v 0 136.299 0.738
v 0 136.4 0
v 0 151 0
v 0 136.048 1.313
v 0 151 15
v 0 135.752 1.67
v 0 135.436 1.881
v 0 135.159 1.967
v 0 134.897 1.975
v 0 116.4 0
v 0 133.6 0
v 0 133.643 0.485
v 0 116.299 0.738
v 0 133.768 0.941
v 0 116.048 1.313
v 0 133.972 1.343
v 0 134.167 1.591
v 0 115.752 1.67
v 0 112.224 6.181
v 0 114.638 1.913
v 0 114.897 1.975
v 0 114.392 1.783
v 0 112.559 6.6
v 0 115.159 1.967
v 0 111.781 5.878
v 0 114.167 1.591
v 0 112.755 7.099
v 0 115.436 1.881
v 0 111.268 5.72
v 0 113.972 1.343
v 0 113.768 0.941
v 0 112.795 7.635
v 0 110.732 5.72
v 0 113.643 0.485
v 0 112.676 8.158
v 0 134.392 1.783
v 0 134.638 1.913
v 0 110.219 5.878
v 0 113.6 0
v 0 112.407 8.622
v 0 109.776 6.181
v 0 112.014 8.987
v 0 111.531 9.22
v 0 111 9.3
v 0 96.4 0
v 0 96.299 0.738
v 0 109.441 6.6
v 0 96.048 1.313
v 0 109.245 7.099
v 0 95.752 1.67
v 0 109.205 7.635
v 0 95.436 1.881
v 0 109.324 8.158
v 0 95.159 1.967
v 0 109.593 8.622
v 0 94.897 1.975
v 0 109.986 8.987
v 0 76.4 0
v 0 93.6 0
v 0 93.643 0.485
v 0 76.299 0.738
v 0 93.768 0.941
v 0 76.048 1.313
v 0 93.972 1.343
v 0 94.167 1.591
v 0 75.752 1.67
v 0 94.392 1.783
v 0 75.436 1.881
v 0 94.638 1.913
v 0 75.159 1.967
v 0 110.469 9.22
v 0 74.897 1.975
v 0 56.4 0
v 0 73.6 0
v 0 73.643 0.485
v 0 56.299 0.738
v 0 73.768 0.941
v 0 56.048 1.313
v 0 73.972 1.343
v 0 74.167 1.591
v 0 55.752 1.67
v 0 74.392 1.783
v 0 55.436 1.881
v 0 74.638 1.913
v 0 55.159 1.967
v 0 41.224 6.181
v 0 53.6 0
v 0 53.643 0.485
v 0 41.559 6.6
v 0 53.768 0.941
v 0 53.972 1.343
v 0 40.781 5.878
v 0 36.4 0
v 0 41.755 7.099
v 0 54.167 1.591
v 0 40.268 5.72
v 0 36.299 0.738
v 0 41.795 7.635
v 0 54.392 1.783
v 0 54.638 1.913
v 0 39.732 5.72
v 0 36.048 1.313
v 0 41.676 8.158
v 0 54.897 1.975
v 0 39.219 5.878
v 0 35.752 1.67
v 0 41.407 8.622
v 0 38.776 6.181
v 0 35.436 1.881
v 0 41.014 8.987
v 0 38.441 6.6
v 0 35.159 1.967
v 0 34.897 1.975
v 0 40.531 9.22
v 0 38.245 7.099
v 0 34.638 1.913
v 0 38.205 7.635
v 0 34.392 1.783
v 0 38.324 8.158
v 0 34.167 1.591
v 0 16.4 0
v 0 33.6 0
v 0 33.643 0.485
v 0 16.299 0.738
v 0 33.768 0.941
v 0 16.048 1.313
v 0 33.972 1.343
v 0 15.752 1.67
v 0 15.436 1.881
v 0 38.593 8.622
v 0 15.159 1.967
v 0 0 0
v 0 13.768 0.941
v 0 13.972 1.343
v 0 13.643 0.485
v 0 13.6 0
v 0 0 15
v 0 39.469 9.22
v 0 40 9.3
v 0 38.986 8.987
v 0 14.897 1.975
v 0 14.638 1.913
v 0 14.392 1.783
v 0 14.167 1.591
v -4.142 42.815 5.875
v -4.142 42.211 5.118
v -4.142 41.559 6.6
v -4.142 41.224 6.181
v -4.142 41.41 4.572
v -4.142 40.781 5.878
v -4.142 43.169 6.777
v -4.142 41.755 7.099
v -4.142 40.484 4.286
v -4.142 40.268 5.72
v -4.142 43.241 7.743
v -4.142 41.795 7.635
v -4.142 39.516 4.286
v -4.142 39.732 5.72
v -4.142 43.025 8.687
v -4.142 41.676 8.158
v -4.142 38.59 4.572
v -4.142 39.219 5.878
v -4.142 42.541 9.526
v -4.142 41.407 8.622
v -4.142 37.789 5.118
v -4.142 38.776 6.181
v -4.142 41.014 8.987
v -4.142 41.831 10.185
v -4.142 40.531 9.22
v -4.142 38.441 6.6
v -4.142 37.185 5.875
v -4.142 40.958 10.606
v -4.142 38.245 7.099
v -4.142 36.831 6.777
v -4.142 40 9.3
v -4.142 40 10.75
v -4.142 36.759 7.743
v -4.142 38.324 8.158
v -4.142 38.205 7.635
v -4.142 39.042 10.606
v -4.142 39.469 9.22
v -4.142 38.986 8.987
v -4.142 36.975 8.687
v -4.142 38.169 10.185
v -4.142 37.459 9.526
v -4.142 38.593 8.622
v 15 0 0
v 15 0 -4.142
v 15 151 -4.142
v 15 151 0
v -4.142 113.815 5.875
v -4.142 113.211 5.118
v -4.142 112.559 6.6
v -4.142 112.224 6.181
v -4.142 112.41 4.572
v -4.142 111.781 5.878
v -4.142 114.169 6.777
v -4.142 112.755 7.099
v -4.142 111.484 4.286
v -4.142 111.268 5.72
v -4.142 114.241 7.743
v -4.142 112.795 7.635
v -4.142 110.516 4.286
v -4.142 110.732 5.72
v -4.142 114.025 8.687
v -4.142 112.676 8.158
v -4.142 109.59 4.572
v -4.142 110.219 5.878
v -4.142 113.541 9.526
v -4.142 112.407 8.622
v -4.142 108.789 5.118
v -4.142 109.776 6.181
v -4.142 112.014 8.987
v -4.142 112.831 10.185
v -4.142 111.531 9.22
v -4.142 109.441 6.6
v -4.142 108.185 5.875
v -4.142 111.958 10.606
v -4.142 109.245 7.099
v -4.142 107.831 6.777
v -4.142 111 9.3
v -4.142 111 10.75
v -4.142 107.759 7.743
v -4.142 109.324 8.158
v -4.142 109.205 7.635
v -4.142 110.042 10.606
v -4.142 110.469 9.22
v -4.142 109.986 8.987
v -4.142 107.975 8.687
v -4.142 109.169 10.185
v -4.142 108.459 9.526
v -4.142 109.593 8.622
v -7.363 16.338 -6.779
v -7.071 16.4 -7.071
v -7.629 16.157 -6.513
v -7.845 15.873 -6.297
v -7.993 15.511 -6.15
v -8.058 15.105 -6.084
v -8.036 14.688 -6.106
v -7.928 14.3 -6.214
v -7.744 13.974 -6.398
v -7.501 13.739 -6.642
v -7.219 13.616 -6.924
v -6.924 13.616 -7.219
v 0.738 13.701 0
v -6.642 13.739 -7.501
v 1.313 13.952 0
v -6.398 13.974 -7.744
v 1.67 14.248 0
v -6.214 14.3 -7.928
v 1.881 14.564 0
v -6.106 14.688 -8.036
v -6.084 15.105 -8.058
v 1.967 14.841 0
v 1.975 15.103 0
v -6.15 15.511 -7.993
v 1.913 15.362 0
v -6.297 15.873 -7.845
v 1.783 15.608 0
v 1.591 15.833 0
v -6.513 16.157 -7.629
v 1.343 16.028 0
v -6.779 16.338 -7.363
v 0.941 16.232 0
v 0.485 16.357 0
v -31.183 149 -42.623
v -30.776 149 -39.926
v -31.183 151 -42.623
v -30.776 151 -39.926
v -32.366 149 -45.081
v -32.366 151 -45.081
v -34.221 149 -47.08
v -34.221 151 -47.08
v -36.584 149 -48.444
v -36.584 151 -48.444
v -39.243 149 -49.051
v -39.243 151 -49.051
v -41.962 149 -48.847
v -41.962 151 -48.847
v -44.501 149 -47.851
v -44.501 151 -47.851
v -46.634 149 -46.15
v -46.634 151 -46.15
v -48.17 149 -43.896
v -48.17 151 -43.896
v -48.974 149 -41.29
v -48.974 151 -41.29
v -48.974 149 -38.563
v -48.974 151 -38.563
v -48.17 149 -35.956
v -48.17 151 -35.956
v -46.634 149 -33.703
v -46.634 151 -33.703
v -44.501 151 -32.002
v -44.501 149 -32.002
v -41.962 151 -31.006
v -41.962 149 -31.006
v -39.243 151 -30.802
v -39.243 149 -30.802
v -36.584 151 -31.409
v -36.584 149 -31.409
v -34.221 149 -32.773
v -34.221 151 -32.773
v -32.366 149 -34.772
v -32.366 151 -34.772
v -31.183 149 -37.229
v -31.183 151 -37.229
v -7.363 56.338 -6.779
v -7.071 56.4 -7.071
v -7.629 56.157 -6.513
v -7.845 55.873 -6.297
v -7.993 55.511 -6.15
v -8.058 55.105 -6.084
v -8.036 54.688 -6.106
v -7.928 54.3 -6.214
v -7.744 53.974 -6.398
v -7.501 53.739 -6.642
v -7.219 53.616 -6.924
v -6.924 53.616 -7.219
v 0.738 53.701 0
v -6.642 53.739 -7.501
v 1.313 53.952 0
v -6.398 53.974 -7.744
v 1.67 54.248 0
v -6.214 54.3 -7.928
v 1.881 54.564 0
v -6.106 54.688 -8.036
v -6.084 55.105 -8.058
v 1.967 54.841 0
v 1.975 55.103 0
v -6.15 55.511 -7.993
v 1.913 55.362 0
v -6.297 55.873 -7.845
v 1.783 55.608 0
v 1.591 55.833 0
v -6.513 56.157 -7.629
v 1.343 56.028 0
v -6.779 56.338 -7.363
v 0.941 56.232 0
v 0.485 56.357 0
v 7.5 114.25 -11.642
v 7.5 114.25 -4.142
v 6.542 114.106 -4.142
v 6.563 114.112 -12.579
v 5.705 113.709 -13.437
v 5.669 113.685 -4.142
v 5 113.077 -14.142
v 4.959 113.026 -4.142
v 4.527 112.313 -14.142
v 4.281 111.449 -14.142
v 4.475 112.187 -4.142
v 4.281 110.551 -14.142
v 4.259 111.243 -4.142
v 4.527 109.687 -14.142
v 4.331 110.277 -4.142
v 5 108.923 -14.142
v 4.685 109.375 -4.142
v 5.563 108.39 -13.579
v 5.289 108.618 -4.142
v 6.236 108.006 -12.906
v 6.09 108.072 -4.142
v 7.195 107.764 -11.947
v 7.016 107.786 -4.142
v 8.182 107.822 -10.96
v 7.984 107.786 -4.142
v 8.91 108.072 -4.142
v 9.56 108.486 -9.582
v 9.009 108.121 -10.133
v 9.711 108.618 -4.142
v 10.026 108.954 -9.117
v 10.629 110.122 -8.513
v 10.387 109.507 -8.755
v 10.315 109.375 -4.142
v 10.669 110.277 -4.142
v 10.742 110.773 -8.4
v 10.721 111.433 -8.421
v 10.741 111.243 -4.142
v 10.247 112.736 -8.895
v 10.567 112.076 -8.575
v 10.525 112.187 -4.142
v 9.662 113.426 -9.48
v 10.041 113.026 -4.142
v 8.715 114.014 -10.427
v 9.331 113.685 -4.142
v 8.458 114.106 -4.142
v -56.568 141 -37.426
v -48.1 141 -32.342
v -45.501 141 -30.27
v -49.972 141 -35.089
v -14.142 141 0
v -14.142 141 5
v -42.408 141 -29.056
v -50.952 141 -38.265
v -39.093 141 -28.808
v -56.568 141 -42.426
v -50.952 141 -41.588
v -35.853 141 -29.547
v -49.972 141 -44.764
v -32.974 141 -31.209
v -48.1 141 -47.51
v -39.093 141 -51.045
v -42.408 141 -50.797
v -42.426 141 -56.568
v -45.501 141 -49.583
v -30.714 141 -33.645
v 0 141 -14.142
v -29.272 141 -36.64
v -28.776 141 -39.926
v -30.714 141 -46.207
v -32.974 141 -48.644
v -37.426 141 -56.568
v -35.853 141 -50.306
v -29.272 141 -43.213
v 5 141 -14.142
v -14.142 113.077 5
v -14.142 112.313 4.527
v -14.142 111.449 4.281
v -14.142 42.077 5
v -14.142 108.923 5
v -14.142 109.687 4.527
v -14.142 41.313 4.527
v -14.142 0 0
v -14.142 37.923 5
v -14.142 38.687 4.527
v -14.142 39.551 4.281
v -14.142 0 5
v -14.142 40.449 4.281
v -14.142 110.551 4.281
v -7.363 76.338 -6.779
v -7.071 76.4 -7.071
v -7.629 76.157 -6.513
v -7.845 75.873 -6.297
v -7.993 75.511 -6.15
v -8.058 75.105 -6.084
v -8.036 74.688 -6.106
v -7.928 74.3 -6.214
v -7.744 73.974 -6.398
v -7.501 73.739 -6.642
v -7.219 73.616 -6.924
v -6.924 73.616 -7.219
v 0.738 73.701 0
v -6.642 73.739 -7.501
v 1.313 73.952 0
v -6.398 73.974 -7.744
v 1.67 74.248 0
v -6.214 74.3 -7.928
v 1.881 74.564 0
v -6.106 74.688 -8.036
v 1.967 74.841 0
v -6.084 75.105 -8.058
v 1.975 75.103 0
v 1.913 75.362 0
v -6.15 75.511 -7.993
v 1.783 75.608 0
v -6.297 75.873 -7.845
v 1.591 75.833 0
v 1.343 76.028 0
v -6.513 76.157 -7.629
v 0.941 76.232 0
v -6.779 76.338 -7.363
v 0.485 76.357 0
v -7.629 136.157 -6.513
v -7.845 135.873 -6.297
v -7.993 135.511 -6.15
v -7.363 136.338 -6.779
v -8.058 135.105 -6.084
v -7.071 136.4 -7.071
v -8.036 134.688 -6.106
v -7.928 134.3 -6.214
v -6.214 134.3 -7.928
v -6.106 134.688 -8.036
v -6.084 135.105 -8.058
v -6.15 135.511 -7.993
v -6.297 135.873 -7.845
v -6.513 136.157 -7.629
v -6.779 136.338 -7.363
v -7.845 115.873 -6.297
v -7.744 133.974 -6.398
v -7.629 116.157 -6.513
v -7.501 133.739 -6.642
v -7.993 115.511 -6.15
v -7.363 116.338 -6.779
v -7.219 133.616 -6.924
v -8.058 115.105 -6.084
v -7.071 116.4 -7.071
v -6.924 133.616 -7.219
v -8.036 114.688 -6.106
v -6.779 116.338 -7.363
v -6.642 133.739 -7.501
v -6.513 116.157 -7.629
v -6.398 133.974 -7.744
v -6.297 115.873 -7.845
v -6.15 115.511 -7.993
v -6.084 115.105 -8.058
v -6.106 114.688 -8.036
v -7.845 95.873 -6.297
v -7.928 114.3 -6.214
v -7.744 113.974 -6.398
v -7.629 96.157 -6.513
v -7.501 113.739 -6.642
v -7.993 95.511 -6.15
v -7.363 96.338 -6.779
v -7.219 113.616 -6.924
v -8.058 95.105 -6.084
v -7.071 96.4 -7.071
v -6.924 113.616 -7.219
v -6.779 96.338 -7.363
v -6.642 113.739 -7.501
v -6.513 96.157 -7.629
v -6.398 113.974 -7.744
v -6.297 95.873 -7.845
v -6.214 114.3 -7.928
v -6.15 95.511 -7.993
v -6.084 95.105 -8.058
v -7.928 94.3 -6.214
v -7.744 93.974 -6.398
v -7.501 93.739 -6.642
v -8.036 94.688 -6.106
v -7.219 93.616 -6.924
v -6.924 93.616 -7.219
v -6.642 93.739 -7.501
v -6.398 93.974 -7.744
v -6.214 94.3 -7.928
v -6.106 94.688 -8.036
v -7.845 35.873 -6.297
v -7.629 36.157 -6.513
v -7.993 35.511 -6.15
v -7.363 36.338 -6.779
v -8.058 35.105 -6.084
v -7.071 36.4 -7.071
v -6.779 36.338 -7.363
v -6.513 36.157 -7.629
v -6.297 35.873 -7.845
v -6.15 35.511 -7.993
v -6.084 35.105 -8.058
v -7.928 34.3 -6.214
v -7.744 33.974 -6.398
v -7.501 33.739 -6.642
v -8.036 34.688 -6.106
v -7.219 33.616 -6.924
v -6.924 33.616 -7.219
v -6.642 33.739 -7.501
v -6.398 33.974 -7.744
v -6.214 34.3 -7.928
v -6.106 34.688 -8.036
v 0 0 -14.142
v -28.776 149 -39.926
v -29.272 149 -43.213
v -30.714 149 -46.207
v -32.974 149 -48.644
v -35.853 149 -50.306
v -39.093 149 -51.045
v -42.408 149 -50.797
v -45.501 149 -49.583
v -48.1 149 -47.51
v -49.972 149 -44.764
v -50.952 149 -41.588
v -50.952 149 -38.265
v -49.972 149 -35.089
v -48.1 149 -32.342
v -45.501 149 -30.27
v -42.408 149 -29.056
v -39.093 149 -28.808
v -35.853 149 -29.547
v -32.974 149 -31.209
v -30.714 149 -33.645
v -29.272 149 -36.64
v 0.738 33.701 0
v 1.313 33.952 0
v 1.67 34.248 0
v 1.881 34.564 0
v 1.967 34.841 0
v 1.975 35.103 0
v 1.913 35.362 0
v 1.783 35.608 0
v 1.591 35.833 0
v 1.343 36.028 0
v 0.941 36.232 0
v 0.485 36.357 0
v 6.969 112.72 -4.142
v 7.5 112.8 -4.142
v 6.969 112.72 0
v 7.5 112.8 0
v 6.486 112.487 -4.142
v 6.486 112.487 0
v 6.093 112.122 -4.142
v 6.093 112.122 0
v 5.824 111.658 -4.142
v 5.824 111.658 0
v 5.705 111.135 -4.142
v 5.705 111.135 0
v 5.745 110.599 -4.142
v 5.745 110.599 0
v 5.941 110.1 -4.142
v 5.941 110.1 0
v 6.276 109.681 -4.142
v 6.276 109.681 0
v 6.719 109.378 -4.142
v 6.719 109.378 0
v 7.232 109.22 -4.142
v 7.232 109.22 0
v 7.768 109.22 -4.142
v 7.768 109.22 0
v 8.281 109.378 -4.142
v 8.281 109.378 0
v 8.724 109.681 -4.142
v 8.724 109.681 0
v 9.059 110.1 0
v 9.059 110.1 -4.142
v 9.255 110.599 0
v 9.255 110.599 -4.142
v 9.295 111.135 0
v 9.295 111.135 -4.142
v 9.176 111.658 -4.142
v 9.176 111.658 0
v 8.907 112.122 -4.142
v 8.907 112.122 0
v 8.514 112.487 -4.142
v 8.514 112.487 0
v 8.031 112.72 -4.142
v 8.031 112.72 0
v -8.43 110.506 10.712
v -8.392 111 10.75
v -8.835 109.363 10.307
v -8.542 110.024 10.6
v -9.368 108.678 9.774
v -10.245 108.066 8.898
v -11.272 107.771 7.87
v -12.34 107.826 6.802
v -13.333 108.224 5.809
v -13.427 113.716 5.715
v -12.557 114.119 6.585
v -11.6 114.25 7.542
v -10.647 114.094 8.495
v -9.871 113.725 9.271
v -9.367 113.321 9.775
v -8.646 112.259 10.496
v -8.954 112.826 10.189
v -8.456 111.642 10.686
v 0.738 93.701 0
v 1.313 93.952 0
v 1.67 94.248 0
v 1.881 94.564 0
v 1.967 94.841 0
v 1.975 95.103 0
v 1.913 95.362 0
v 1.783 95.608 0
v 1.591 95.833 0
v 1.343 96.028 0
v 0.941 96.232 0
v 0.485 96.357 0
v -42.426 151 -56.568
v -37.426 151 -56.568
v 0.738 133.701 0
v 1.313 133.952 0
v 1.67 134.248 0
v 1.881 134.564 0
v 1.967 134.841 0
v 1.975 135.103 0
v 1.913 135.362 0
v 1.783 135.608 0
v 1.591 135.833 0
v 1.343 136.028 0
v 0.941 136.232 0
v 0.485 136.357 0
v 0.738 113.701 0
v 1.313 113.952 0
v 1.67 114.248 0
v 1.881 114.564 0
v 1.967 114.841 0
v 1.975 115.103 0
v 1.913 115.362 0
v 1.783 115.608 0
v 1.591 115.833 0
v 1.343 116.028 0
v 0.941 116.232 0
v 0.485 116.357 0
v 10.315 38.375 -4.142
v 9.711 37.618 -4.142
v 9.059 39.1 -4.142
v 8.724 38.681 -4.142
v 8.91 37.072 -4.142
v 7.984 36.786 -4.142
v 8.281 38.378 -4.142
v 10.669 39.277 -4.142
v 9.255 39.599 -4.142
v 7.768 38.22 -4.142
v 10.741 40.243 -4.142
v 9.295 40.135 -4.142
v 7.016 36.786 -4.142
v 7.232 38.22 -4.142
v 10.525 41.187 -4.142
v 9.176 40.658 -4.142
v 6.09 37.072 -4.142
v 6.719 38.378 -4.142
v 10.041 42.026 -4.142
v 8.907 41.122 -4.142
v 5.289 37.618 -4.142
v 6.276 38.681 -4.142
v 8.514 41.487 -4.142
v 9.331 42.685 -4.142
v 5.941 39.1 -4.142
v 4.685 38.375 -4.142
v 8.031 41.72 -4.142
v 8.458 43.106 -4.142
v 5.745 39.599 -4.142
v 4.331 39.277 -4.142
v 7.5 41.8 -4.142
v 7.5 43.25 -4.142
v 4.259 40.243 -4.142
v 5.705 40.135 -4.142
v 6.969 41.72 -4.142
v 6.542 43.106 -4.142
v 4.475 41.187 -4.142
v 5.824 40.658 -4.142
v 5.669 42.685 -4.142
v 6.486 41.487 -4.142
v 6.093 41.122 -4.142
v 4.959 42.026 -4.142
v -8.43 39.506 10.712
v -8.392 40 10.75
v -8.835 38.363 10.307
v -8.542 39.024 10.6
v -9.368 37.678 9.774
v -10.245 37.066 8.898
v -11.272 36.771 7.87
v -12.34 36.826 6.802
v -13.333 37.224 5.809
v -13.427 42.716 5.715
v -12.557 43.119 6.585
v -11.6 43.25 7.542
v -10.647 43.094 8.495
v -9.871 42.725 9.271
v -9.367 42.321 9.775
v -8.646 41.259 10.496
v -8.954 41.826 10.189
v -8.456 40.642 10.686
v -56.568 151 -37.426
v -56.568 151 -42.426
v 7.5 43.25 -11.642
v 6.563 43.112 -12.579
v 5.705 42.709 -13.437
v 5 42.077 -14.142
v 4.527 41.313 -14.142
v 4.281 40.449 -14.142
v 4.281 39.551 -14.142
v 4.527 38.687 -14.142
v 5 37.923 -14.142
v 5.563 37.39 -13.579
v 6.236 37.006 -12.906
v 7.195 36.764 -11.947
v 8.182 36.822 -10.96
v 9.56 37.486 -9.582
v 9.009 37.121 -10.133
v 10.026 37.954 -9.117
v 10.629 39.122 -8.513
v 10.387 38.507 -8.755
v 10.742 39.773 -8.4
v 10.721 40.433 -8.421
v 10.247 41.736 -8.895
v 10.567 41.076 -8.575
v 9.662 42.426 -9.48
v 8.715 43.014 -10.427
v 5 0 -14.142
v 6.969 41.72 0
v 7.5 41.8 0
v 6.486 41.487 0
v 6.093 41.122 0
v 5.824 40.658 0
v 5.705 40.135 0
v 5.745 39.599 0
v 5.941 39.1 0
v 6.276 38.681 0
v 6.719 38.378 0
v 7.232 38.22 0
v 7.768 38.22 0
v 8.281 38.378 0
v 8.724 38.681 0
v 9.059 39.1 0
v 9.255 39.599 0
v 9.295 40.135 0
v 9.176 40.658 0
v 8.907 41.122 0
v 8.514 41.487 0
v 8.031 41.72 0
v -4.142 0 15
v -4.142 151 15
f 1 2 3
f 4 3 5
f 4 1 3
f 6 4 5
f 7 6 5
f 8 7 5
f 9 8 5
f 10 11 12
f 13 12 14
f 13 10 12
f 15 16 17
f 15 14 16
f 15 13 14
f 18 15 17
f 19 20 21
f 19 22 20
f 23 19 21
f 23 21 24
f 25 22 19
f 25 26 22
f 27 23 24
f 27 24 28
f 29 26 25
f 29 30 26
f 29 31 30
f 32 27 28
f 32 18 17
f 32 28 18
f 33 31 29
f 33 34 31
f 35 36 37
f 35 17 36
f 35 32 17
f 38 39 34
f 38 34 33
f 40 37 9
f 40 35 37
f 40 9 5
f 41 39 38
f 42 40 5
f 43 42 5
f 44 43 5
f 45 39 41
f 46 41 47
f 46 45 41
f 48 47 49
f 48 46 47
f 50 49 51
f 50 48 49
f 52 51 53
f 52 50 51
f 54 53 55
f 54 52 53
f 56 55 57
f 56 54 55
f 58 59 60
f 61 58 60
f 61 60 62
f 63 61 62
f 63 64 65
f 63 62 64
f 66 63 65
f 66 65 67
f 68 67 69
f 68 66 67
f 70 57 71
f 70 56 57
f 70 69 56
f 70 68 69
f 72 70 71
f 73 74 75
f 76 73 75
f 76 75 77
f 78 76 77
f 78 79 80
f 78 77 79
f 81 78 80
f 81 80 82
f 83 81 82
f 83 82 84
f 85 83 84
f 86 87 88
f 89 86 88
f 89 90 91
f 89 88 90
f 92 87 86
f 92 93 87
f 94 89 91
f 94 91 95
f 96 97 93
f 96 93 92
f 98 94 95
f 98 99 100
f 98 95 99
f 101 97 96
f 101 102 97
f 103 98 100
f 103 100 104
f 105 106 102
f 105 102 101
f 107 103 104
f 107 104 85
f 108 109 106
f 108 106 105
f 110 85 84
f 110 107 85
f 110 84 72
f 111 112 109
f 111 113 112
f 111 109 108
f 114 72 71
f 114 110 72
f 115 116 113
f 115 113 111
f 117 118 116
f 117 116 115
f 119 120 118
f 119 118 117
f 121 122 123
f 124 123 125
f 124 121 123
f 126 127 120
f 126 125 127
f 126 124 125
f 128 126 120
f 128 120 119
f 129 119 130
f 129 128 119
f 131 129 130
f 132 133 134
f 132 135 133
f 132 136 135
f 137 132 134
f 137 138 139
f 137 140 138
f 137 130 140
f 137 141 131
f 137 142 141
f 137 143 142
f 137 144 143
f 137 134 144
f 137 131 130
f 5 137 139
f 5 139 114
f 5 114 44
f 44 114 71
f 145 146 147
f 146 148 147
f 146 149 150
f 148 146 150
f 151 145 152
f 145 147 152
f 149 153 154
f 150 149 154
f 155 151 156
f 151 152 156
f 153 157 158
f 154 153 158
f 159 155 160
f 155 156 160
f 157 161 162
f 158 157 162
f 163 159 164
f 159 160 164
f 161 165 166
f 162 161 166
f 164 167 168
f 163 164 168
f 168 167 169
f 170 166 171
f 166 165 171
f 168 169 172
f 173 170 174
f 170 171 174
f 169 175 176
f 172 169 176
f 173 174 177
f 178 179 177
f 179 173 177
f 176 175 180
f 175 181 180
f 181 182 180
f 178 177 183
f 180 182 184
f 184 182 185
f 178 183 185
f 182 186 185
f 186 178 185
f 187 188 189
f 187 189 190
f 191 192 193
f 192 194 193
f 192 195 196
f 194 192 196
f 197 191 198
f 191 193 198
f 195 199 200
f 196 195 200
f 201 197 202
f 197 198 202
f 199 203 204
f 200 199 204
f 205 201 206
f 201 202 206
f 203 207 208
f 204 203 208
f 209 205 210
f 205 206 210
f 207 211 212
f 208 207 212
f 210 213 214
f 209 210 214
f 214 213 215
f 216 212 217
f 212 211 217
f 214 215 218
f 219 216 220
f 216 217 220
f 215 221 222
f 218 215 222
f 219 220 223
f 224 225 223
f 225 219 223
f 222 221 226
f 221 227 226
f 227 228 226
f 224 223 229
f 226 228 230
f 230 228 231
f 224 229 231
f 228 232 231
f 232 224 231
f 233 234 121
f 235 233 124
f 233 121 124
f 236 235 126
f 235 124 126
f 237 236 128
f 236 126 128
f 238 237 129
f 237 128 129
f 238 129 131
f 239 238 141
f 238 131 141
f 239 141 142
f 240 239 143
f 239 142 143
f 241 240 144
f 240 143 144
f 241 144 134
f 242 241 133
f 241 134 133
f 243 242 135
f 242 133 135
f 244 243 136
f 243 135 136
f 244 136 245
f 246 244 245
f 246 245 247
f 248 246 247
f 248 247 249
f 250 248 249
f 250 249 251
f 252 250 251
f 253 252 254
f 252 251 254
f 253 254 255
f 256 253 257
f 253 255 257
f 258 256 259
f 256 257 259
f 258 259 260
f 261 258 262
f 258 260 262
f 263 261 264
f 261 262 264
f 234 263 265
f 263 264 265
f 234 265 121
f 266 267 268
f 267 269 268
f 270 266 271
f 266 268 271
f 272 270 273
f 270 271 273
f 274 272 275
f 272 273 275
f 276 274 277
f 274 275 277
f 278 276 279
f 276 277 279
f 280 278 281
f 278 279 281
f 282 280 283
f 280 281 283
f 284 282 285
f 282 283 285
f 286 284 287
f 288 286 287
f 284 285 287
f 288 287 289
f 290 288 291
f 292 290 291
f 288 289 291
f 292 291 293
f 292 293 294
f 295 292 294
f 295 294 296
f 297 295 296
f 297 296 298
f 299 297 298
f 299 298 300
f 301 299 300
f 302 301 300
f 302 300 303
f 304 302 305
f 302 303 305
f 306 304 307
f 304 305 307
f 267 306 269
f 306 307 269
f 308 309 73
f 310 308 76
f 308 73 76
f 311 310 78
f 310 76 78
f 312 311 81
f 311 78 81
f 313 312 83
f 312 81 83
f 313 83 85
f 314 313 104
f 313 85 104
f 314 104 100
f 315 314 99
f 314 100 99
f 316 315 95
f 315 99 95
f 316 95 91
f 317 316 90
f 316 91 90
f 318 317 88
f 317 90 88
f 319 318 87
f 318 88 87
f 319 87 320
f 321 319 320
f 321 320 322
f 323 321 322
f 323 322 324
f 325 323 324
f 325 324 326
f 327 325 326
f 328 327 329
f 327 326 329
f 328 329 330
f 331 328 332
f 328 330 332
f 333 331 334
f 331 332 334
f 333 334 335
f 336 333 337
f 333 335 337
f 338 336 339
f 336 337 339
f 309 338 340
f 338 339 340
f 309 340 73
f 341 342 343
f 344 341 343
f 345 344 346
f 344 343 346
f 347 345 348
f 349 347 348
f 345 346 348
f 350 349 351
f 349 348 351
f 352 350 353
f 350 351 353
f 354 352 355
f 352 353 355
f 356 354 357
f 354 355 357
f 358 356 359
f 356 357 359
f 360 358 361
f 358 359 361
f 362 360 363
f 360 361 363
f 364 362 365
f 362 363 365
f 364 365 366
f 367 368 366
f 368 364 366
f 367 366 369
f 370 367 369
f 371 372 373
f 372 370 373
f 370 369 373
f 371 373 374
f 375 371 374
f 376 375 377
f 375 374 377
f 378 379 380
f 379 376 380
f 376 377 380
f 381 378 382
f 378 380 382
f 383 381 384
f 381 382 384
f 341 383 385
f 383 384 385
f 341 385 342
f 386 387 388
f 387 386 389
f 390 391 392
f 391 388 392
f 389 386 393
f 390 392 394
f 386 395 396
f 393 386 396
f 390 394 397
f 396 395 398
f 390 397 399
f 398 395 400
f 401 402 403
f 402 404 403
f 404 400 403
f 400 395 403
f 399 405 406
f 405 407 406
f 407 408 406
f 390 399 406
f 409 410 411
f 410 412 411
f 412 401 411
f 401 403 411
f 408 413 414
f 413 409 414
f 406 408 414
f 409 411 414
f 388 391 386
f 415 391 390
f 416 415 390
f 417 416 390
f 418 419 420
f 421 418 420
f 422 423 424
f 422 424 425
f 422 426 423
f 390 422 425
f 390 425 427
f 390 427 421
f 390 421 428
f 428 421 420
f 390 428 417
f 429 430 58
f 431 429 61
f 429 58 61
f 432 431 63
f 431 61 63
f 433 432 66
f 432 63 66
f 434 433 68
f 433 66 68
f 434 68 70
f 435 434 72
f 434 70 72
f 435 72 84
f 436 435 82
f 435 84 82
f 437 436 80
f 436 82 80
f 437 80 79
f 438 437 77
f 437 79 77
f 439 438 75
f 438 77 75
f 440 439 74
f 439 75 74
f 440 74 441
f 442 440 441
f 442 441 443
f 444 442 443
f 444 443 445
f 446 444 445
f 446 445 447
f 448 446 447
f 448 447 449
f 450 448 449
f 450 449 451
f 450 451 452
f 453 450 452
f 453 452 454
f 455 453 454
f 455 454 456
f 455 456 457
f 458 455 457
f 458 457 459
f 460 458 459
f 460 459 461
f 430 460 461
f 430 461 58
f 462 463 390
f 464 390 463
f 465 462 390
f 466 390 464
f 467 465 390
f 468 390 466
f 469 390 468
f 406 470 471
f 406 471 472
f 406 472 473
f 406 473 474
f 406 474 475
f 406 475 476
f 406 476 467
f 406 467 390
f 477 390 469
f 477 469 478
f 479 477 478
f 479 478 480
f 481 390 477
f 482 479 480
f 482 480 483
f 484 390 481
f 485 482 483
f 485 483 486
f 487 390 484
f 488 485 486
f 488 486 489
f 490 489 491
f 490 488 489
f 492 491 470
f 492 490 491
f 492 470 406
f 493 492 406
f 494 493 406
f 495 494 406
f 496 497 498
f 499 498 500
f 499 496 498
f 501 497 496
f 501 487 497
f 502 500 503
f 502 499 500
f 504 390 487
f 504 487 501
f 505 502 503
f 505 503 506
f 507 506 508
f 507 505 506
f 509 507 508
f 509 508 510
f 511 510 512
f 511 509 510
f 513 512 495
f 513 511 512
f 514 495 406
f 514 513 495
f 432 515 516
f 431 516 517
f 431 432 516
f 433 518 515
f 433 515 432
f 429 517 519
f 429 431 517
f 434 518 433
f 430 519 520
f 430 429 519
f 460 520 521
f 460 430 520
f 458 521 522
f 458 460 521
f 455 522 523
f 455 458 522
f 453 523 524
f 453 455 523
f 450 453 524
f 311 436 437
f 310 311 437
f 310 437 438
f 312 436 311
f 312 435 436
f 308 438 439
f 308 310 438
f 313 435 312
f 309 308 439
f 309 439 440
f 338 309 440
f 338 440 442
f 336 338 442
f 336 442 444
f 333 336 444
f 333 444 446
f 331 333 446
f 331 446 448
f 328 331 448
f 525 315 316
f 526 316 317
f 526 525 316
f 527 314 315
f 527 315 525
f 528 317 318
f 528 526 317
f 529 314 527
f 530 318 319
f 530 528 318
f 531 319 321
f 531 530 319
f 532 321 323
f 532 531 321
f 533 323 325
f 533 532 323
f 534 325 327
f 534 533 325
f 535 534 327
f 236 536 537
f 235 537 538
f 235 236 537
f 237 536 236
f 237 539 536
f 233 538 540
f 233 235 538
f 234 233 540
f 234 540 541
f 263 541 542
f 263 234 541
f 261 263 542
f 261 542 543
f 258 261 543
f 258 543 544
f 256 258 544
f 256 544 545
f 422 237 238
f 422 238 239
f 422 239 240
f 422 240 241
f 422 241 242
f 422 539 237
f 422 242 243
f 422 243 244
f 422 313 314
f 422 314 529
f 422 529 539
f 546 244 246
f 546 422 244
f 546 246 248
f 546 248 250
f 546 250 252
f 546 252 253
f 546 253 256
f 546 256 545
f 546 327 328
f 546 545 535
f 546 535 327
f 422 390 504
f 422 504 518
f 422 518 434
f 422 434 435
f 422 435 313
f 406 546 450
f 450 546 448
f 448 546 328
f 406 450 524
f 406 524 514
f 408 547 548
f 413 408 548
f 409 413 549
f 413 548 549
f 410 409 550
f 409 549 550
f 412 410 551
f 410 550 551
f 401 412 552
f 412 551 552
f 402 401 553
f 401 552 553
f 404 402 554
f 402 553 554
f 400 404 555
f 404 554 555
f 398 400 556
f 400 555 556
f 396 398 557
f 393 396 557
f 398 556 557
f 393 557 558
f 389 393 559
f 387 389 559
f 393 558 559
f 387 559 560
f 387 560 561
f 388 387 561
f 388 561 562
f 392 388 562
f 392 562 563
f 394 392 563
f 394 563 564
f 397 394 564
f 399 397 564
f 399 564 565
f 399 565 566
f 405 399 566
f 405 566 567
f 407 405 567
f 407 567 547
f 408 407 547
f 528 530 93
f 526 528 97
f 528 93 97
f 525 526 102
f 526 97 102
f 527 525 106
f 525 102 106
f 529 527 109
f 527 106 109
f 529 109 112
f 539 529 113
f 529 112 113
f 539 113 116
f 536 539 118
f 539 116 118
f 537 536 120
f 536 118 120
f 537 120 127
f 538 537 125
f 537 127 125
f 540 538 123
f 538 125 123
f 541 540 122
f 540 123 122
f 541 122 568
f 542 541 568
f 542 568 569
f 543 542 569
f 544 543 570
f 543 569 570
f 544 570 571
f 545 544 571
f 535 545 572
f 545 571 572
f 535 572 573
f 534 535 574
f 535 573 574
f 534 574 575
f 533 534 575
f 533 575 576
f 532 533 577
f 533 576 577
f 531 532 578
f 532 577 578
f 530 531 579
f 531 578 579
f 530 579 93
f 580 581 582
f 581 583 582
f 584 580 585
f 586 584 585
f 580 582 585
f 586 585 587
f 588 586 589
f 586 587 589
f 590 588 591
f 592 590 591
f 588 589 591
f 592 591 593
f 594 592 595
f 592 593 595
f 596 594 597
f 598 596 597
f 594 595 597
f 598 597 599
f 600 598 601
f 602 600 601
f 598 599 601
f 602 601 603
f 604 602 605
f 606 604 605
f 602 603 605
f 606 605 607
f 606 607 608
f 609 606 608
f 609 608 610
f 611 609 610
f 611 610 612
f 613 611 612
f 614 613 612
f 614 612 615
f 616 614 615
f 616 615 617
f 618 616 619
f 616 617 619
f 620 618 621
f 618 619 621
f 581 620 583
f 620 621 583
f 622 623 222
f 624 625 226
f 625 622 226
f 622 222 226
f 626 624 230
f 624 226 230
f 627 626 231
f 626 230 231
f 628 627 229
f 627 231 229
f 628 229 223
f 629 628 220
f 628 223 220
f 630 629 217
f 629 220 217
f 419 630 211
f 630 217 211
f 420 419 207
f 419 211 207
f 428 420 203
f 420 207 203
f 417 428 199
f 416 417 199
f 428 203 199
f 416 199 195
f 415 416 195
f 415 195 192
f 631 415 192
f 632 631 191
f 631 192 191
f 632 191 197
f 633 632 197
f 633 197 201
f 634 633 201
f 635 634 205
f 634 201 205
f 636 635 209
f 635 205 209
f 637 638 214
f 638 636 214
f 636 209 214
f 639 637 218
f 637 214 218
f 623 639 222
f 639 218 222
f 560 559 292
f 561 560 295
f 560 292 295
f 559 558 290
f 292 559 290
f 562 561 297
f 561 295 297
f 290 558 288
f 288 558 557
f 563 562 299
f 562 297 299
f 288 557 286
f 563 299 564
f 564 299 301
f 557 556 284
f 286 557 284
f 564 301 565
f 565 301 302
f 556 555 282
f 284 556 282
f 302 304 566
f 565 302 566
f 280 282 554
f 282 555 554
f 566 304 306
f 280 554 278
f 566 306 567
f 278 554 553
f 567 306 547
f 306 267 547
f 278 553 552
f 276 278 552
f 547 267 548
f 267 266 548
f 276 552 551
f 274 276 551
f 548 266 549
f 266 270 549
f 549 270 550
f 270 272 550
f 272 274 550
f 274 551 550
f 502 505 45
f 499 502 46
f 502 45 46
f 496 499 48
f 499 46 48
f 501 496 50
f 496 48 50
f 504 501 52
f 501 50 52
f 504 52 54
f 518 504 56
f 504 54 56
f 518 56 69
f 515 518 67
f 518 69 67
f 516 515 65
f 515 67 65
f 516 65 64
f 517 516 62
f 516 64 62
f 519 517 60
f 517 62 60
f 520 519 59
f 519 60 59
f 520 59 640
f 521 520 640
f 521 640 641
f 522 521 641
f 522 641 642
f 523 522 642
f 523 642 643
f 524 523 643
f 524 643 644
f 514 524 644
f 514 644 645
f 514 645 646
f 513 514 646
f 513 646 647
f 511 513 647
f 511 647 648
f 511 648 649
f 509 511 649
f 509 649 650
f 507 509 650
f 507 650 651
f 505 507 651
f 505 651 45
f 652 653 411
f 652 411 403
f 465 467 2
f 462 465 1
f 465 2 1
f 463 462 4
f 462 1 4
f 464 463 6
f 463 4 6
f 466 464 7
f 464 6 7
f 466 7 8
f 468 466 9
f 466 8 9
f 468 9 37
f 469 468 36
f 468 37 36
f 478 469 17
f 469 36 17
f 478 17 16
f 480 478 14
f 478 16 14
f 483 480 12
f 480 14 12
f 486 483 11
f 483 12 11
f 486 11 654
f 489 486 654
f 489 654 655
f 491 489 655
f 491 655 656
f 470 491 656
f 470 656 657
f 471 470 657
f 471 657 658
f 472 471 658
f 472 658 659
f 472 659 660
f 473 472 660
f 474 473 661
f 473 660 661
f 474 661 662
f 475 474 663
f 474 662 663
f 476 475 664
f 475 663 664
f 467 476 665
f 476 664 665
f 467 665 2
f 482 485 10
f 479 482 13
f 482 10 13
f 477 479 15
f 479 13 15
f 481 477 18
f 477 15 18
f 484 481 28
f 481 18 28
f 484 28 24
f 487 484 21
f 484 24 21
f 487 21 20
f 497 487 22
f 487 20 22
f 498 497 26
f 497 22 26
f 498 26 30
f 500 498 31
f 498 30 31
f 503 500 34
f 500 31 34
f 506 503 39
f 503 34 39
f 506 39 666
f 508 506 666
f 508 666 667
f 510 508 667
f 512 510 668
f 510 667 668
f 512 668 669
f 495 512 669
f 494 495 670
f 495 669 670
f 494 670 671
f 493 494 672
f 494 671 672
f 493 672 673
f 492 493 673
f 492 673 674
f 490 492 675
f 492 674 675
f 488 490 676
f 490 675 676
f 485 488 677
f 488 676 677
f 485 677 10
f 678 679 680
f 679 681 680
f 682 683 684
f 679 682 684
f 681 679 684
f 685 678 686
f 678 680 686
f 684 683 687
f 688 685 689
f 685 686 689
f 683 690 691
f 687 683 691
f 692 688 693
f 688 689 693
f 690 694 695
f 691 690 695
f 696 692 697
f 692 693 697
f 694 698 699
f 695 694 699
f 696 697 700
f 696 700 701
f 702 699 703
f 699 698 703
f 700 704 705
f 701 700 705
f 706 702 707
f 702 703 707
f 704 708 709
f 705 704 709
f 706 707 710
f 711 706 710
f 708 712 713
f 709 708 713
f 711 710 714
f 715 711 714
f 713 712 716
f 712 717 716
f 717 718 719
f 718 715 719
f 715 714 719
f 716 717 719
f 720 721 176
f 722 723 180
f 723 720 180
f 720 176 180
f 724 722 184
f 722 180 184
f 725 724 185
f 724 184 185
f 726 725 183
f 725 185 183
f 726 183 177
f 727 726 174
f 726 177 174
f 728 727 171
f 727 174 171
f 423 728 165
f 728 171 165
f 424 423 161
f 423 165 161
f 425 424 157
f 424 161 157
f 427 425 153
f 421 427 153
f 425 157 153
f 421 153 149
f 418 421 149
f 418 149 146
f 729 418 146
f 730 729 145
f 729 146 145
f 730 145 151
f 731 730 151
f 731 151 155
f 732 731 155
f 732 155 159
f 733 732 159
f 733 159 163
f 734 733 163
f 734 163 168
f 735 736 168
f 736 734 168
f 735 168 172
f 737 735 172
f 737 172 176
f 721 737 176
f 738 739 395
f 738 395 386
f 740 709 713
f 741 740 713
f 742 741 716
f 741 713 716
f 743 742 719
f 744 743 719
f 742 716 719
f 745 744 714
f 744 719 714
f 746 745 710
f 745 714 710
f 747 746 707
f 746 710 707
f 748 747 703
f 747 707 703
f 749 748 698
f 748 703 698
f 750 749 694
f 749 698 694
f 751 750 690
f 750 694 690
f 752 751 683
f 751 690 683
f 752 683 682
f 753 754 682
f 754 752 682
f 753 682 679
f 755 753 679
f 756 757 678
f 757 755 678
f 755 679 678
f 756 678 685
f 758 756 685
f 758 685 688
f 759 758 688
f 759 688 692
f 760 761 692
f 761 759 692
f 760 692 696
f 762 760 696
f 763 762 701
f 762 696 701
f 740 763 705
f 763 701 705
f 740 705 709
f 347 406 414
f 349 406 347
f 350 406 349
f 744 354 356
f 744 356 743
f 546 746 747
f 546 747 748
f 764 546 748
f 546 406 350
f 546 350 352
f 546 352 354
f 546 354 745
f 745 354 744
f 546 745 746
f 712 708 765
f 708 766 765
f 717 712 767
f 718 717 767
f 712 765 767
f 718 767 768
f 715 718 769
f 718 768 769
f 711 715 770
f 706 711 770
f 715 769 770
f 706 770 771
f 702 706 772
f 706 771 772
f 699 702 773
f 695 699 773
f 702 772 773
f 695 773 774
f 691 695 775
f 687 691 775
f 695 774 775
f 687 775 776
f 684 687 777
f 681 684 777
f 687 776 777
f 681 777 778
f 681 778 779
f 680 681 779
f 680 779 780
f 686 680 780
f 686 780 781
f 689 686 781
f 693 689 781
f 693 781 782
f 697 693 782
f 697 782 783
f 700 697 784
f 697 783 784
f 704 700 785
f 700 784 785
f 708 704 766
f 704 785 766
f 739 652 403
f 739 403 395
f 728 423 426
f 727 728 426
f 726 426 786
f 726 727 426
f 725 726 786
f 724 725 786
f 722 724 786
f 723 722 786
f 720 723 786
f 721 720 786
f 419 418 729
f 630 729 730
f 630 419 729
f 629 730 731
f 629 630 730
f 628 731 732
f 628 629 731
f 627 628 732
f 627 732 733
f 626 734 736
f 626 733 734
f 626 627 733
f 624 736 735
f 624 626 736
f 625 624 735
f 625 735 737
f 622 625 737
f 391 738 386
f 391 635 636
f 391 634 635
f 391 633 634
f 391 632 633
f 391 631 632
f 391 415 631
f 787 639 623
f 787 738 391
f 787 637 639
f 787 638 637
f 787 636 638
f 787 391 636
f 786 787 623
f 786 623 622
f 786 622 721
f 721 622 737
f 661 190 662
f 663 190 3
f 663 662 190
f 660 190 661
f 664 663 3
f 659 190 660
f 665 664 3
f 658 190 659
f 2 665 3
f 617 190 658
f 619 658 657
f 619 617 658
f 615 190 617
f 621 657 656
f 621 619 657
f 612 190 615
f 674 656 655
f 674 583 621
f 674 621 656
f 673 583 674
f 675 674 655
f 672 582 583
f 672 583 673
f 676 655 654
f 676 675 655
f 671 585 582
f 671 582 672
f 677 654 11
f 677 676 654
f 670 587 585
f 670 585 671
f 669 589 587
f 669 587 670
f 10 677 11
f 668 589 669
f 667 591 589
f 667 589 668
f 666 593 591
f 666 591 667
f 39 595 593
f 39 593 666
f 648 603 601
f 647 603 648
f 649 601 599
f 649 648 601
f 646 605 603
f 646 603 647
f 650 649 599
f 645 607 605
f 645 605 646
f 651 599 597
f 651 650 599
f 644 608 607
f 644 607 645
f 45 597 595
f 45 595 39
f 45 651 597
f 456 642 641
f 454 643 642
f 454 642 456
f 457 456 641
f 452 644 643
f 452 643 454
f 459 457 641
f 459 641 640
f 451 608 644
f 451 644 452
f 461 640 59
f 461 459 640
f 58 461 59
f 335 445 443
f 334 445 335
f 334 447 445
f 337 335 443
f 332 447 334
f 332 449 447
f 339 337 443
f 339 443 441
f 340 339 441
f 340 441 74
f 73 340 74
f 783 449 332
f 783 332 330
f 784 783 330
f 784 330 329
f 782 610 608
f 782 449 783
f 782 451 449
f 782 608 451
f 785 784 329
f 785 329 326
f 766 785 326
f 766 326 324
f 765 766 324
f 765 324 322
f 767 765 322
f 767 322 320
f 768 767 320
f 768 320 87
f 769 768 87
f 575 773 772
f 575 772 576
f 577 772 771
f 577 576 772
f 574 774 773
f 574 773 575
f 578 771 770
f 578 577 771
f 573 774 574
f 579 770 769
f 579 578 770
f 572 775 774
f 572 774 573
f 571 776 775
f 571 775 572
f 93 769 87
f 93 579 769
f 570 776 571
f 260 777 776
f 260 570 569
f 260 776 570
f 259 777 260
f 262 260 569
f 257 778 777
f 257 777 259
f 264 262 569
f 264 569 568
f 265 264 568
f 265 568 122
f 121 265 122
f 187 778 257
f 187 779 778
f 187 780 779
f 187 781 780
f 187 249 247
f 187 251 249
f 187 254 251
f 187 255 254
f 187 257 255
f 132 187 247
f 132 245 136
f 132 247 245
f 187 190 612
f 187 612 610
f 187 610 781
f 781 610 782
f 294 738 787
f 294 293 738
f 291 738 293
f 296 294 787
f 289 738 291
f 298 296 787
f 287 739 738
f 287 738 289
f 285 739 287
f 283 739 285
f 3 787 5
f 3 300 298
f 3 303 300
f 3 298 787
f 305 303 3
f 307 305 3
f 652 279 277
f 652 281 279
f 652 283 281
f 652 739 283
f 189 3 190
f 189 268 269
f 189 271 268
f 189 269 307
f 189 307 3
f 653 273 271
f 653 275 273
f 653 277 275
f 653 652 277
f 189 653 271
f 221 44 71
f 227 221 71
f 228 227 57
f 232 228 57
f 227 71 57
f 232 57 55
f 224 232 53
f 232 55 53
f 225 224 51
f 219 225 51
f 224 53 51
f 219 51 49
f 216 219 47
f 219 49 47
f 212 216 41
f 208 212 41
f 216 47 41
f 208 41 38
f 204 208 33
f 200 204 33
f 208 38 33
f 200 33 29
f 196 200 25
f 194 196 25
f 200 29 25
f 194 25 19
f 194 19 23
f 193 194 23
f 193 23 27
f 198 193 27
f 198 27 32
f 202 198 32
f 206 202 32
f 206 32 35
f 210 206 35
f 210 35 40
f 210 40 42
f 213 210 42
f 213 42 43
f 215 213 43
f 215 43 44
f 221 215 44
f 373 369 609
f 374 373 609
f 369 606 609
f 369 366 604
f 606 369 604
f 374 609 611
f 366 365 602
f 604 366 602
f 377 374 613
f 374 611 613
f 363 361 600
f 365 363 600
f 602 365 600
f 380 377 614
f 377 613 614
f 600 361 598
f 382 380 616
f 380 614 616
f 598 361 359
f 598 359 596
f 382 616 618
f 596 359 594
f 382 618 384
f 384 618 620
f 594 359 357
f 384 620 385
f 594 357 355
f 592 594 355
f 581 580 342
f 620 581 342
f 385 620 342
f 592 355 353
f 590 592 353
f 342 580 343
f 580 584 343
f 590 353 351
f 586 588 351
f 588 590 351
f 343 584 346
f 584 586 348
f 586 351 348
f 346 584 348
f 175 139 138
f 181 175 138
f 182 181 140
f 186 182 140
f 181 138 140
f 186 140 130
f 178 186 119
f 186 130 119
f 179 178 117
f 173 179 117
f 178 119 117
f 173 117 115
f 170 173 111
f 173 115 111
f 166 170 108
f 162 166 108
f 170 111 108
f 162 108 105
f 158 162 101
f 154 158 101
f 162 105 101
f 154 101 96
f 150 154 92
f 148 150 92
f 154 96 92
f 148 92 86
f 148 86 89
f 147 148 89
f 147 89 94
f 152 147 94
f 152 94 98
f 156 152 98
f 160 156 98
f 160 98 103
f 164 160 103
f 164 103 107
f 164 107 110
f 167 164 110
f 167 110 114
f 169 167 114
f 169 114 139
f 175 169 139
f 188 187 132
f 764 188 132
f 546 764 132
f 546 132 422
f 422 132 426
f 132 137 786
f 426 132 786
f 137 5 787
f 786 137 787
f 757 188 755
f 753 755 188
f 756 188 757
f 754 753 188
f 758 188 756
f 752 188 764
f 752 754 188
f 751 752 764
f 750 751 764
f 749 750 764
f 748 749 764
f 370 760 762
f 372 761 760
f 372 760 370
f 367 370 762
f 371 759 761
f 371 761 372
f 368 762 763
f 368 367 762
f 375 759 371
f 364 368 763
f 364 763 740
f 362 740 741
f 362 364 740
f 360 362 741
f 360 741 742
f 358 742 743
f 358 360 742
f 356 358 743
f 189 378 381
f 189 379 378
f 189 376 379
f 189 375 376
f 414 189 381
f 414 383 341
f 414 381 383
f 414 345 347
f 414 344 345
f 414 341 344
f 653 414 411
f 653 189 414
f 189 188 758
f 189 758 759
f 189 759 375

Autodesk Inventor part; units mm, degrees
ref_plane "YZ Plane" through (0, 0, 0) normal (1, 0, 0) x (0, 1, 0)
ref_plane "XZ Plane" through (0, 0, 0) normal (0, 1, 0) x (-1, 0, 0)
ref_plane "XY Plane" through (0, 0, 0) normal (0, 0, 1) x (1, 0, 0)
sketch "Sketch1" plane through (0, 0, 0) normal (0, 1, 0) x (-1, 0, 0)
  line L0 (0, 0) -> (0, 15)
  line L1 (0, 15) -> (14.1421, 15)
  line L2 (14.1421, 15) -> (14.1421, 0)
  line L3 (14.1421, 0) -> (0, -14.1421)
  line L4 (0, -14.1421) -> (-15, -14.1421)
  line L5 (-15, -14.1421) -> (-15, 0)
  line L6 (-15, 0) -> (0, 0)
  dimension "d0" = 15
  dimension "d1" = 10
extrude "Extrusion1" add sketch "Sketch1" along normal blind 151
chamfer "Chamfer1" distance 10 angle 45 2 edges at (-14.1421, 75.5, 15) (15, 75.5, -14.1421)
sketch "Sketch2" plane through (0, 151, 0) normal (0, 1, 0) x (1, 0, 0)
  line L0 (5, 14.1421) -> (15, 4.1421) projected
  line L1 (5, 14.1421) -> (0, 14.1421) projected
  line L2 (0, 14.1421) -> (-14.1421, 0) projected
  line L3 (-14.1421, 0) -> (-14.1421, -5) projected
  line L4 (-4.1421, -15) -> (-14.1421, -5) projected
  line L5 (-4.1421, -15) -> (0, -15) projected
  line L6 (0, -15) -> (0, 0) projected
  line L7 (0, 0) -> (15, 0) projected
  line L8 (15, 0) -> (15, 4.1421) projected
  circle A0 centre (-39.9264, 39.9264) radius 11.15
  line L9 (5, 14.1421) -> (-37.4264, 56.5685)
  line L10 (-37.4264, 56.5685) -> (-42.4264, 56.5685)
  line L11 (-42.4264, 56.5685) -> (-56.5685, 42.4264)
  line L12 (-56.5685, 42.4264) -> (-56.5685, 37.4264)
  line L13 (-56.5685, 37.4264) -> (-14.1421, -5)
  line L14 (-4.1421, -15) -> (-14.1421, -5) projected
  line L15 (5, 14.1421) -> (15, 4.1421) projected
  line L16 (-14.1421, 0) -> (-14.1421, -5) projected
  dimension "d7" = 22.3
  dimension "d8" = 60
  dimension "d9" = 27.0711
  dimension "d10" = 13.5355
  dimension "d11" = 13.5355
extrude "Extrusion2" add sketch "Sketch2" against normal blind 10 contours L1 L2 L3 L13 L12 L11 L10 L9
sketch "Sketch3" plane through (0, 151, 0) normal (0, 1, 0) x (1, 0, 0)
  circle A0 centre (-39.9264, 39.9264) radius 11.15 projected
  circle A1 centre (-39.9264, 39.9264) radius 9.15
  point P0 (0, 0)
  dimension "d14" = 2
extrude "Extrusion3" add sketch "Sketch3" against normal blind 2
sketch "Sketch4" plane through (-14.1421, 0, 0) normal (-1, 0, 0) x (0, 0, 1)
  line L0 (5, 141) -> (0, 141) projected
  line L1 (0, 0) -> (0, 141) projected
  line L2 (0, 0) -> (5, 0) projected
  line L3 (5, 141) -> (5, 0) projected
  line L4 (-37.4264, 151) -> (15, 151) projected
  line L5 (-37.4264, 151) -> (-37.4264, 141) projected
  line L6 (5, 141) -> (-37.4264, 141) projected
  line L7 (5, 141) -> (5, 0) projected
  line L8 (5, 0) -> (15, 0) projected
  line L9 (15, 0) -> (15, 151) projected
  point P0 (0, 0)
  point P1 (7.5, 40)
  point P2 (7.5, 111)
  dimension "d17" = 7.5
  dimension "d18" = 40
  dimension "d19" = 40
hole "Hole1" at (-14.1421, 40, 7.5) at (-14.1421, 111, 7.5) direction (1, 0, 0) diameter 3.6 end through all counterbore diameter 6.5 counterbore depth 10 clearance for "Hex Head Cap Screw ISO 24017" size "M3" standard "ISO"
sketch "Sketch5" plane through (5, 0, -14.1421) normal (0, 0, -1) x (-1, 0, 0)
  line L0 (5, 141) -> (0, 141) projected
  line L1 (0, 0) -> (0, 141) projected
  line L2 (0, 0) -> (5, 0) projected
  line L3 (5, 0) -> (5, 141) projected
  line L4 (-10, 151) -> (42.4264, 151) projected
  line L5 (-10, 151) -> (-10, 0) projected
  line L6 (-10, 0) -> (0, 0) projected
  line L7 (0, 0) -> (0, 141) projected
  line L8 (42.4264, 141) -> (0, 141) projected
  line L9 (42.4264, 151) -> (42.4264, 141) projected
  point P0 (-2.5, 40)
  point P1 (-2.5, 111)
  dimension "d27" = 7.5
  dimension "d28" = 40
  dimension "d29" = 40
hole "Hole2" at (7.5, 40, -14.1421) at (7.5, 111, -14.1421) direction (0, 0, 1) diameter 3.6 end through all counterbore diameter 6.5 counterbore depth 10 clearance for "Hex Head Cap Screw ISO 24017" size "M3" standard "ISO"
sketch "Sketch6" plane through (0, 0, -14.1421) normal (-0.7071, 0, -0.7071) x (-0.7071, 0, 0.7071)
  circle A0 centre (10, -125) radius 3 projected
  circle A1 centre (10, -85) radius 3 projected
  circle A2 centre (10, -45) radius 3 projected
  circle A3 centre (10, -5) radius 3 projected
  circle A4 centre (10, 35) radius 3 projected
  circle A5 centre (10, 75) radius 3 projected
  circle A6 centre (10, 115) radius 3 projected
  circle A7 centre (10, 135) radius 3 projected
  circle A8 centre (10, 95) radius 3 projected
  circle A9 centre (10, 55) radius 3 projected
  circle A10 centre (10, 15) radius 3 projected
  circle A11 centre (10, -25) radius 3 projected
  circle A12 centre (10, -65) radius 3 projected
  circle A13 centre (10, -105) radius 3 projected
  circle A14 centre (10, -145) radius 3 projected
  line L0 (14.5, 140) -> (5.5, 140) projected
  line L1 (5.5, 140) -> (5.5, -210) projected
  line L2 (14.5, -210) -> (5.5, -210) projected
  line L3 (14.5, 140) -> (14.5, -210) projected
  circle A15 centre (10, -205) radius 3 projected
  circle A16 centre (10, -165) radius 3 projected
  circle A17 centre (10, -185) radius 3 projected
  point P0 (10, 0)
hole "Hole3" at (-7.0711, 15, -7.0711) at (-7.0711, 35, -7.0711) at (-7.0711, 55, -7.0711) at (-7.0711, 75, -7.0711) at (-7.0711, 95, -7.0711) at (-7.0711, 115, -7.0711) at (-7.0711, 135, -7.0711) direction (0.7071, 0, 0.7071) diameter 2.8 end through all
equation "\"d10\" = 0.5 * d9"
equation "\"d11\" = d10"
equation "\"d19\" = d18"
equation "\"d29\" = d28"
properties part number "Corner Z Brace w Bearing" material "ABS Plastic"
